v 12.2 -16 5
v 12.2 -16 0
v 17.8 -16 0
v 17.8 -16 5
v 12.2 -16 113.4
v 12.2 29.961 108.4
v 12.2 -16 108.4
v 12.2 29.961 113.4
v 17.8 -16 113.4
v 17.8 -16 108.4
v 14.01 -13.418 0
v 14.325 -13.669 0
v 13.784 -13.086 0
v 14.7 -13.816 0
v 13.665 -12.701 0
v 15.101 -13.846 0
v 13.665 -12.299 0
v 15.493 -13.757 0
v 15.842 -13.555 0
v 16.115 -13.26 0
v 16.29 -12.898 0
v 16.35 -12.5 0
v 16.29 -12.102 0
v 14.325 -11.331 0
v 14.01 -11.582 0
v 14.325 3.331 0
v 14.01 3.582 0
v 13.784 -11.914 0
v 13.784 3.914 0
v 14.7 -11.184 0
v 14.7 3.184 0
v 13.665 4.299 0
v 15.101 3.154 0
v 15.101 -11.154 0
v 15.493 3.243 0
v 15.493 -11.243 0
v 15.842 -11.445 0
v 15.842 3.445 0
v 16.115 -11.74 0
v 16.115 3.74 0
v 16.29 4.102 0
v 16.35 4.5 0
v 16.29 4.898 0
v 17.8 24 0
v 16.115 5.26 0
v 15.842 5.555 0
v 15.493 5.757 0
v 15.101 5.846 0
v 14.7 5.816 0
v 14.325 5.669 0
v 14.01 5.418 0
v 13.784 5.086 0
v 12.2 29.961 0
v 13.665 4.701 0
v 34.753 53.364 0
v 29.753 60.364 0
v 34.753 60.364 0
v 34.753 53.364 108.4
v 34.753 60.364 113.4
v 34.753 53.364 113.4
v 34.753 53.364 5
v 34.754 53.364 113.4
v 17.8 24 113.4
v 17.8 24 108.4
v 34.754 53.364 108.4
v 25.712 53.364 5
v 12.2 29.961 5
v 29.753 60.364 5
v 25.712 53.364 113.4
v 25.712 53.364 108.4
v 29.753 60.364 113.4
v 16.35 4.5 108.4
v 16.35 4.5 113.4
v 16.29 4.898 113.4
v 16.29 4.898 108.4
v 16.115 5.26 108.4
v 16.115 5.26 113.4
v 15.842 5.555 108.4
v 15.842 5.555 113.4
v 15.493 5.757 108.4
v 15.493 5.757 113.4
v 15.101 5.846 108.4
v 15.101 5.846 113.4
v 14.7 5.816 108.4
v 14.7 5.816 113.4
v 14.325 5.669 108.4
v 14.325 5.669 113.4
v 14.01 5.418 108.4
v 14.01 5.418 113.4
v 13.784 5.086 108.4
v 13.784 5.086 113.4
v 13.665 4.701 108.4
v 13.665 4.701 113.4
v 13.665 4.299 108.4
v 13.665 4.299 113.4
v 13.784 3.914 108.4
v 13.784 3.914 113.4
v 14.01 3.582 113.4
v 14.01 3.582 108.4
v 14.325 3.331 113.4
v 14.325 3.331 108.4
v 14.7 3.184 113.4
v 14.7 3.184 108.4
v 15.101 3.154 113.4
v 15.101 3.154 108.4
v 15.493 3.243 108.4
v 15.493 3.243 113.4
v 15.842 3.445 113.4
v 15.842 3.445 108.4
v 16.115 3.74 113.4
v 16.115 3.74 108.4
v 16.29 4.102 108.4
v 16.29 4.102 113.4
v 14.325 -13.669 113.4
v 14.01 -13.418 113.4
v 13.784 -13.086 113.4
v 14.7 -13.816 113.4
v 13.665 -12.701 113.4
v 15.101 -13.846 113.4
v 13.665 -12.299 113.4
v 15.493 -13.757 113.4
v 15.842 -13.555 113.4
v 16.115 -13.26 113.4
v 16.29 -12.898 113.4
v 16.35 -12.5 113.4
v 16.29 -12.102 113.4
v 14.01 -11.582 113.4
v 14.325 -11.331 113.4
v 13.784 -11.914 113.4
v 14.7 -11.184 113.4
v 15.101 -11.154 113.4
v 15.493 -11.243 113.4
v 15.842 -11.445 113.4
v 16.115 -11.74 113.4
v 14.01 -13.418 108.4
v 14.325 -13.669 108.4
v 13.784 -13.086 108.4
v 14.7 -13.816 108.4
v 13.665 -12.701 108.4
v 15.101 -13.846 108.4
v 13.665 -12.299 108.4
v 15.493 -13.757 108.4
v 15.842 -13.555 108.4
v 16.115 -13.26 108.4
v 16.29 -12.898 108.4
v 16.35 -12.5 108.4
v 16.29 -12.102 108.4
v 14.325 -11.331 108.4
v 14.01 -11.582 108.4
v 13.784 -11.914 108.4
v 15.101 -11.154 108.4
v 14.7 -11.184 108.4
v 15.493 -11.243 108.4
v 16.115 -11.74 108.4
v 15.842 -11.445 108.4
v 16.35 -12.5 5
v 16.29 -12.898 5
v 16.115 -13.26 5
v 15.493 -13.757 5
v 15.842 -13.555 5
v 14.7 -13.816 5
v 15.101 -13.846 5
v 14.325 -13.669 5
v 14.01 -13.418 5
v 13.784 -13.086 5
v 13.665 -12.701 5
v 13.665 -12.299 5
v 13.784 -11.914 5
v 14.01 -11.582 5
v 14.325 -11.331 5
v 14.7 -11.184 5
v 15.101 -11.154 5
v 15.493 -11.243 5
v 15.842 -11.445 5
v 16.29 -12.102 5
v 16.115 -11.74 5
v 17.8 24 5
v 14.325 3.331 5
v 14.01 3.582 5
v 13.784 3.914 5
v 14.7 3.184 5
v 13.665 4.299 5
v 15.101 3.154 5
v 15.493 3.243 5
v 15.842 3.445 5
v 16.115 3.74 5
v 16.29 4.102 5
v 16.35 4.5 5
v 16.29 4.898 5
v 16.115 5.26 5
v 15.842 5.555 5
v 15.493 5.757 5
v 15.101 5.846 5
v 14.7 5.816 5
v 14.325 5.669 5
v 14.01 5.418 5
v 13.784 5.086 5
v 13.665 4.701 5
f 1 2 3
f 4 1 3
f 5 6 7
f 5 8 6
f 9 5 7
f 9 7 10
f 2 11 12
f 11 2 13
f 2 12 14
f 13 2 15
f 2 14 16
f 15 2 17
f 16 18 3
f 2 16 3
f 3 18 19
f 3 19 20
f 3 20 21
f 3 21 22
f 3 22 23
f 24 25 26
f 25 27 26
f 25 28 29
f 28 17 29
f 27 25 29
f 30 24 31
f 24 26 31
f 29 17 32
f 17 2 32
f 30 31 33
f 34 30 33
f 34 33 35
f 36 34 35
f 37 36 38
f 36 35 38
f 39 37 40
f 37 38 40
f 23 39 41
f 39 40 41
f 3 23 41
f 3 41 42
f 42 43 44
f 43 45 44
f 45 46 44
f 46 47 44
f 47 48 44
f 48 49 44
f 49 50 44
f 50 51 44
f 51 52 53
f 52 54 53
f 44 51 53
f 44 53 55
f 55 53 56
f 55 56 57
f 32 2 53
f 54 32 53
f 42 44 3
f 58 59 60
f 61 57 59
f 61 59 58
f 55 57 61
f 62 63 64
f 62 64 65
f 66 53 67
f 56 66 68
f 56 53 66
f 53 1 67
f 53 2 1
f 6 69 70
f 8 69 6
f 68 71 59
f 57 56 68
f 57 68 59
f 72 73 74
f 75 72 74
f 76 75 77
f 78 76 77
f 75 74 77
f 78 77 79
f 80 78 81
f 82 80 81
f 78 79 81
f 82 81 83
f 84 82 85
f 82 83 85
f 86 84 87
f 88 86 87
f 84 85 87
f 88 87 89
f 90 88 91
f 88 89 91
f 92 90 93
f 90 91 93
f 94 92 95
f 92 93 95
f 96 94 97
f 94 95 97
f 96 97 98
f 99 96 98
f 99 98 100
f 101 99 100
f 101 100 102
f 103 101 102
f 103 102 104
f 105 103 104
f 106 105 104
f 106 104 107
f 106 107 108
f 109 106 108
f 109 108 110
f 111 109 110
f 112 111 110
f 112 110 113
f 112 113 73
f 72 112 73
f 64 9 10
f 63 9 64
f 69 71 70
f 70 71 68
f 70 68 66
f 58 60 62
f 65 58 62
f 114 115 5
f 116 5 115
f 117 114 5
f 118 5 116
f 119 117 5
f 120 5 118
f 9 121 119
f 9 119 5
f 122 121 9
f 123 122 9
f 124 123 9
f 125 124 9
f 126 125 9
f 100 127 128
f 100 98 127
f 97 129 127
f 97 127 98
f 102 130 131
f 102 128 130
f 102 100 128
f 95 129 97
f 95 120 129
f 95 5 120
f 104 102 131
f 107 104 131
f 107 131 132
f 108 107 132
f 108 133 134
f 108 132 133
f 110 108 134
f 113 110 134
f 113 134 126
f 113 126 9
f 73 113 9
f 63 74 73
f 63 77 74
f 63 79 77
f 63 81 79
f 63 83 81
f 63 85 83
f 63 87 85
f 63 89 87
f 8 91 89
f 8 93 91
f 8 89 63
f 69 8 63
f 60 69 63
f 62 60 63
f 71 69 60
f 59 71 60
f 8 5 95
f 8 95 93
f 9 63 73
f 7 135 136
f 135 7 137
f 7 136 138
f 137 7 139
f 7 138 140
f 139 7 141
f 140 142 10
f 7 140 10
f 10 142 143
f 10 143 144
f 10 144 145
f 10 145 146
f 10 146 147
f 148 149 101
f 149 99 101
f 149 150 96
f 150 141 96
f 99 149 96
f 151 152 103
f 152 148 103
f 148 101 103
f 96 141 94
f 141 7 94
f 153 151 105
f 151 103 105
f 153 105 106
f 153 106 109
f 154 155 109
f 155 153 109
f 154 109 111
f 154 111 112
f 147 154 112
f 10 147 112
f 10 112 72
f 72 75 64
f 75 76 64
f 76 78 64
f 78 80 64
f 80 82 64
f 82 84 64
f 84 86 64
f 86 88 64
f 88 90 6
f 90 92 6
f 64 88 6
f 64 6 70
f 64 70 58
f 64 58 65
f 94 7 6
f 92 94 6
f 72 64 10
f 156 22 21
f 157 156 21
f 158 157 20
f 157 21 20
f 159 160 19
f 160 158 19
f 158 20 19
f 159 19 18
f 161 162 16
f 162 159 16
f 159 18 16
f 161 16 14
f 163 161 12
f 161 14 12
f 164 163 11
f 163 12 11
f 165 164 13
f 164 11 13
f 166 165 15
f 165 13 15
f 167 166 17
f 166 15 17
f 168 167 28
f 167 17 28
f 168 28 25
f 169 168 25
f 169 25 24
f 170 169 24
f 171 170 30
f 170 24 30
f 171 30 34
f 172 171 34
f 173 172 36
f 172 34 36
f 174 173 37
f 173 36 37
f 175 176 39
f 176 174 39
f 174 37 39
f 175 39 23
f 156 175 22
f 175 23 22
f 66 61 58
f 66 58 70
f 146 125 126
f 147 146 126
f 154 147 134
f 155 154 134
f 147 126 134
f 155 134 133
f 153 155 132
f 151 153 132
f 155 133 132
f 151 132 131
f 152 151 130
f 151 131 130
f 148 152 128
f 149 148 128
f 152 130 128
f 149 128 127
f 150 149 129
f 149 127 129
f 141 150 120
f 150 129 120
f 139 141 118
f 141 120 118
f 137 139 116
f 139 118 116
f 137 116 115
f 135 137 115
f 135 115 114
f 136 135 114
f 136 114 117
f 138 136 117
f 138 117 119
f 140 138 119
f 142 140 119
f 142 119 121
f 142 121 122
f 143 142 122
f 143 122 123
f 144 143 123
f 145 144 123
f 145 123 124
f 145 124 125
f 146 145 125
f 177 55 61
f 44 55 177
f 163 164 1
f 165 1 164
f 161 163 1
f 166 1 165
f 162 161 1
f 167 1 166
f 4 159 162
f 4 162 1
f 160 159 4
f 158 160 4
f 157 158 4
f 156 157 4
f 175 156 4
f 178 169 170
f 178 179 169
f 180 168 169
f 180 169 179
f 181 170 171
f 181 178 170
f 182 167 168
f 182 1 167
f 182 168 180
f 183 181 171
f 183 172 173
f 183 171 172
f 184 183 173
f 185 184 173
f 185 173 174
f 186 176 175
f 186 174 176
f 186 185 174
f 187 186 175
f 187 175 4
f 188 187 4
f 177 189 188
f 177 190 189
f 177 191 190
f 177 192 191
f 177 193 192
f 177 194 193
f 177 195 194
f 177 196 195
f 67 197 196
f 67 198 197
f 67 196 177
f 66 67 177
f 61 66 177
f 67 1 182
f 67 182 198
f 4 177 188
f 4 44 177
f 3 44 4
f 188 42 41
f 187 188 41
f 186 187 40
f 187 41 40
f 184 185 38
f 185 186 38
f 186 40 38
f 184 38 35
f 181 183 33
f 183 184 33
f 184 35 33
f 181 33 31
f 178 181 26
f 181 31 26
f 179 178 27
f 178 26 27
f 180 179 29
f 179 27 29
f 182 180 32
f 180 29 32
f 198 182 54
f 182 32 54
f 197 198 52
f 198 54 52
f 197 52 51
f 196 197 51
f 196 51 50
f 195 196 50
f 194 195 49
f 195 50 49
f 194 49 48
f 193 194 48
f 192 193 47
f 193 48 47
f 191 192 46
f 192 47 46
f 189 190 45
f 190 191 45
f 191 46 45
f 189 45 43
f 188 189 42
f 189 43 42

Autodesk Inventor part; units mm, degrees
ref_plane "YZ Plane" through (0, 0, 0) normal (1, 0, 0) x (0, 1, 0)
ref_plane "XZ Plane" through (0, 0, 0) normal (0, 1, 0) x (-1, 0, 0)
sketch "Sketch1" plane through (0, 0, 0) normal (0, 0, 1) x (1, 0, 0)
  arc A0 (12.2, 9) -> (9.2, 12) centre (9.2, 9) ccw projected
  line L0 (12.7, 12) -> (9.2, 12) projected
  line L1 (12.7, 12) -> (17.8, 6) projected
  line L2 (17.8, 6) -> (17.8, -32.6) projected
  line L3 (17.8, -32.6) -> (12.7, -38.6) projected
  line L4 (12.7, -38.6) -> (-12.7, -38.6) projected
  line L5 (-12.7, -38.6) -> (-17.8, -32.6) projected
  line L6 (-17.8, -32.6) -> (-17.8, 6) projected
  line L7 (-17.8, 6) -> (-12.7, 12) projected
  line L8 (-9.2, 12) -> (-12.7, 12) projected
  arc A1 (-9.2, 12) -> (-12.2, 9) centre (-9.2, 9) ccw projected
  line L9 (-12.2, -30) -> (-12.2, 9) projected
  arc A2 (-12.2, -30) -> (-9.2, -33) centre (-9.2, -30) ccw projected
  line L10 (9.2, -33) -> (-9.2, -33) projected
  arc A3 (9.2, -33) -> (12.2, -30) centre (9.2, -30) ccw projected
  line L11 (12.2, 9) -> (12.2, -30) projected
  circle A4 centre (-15, -29.5) radius 1.35 projected
  circle A5 centre (15, -29.5) radius 1.35 projected
  circle A6 centre (-8.5, -35.8) radius 1.35 projected
  circle A7 centre (-15, -12.5) radius 1.35 projected
  circle A8 centre (-15, 4.5) radius 1.35 projected
  circle A9 centre (8.5, -35.8) radius 1.35 projected
  circle A10 centre (15, -12.5) radius 1.35 projected
  circle A11 centre (15, 4.5) radius 1.35 projected
  line L12 (12.2, -16) -> (12.2, 29.9608)
  line L13 (29.7534, 60.3642) -> (34.7534, 60.3642)
  line L14 (34.7534, 60.3642) -> (34.7534, 53.3642)
  line L15 (34.7534, 53.3642) -> (17.8, 24)
  line L16 (17.8, 24) -> (17.8, -16)
  line L17 (12.2, -16) -> (17.8, -16)
  circle A12 centre (15, -12.5) radius 1.35
  circle A13 centre (15, 4.5) radius 1.35
  line L18 (12.2, 29.9608) -> (29.7534, 60.3642)
  point P0 (0, 0)
  dimension "d1" = 2.7
  dimension "d2" = 2.7
  dimension "d3" = 5.6
  dimension "d4" = 3.5
  dimension "d5" = 40
  dimension "d6" = 30
  dimension "d7" = 7
  dimension "d9" = 5
extrude "Extrusion1" add sketch "Sketch1" along normal blind 5 contours L12 L0 L1 L2 L17 L11 | L12 L18 L13 L14 L15 L16 L1 L0
sketch "Sketch2" plane through (0, 0, 5) normal (0, 0, 1) x (1, 0, 0)
  line L0 (34.7534, 60.3642) -> (34.7534, 53.3642) projected
  line L1 (29.7534, 60.3642) -> (34.7534, 60.3642) projected
  line L2 (34.7534, 60.3642) -> (29.7534, 60.3642)
  line L3 (34.7534, 60.3642) -> (29.7534, 60.3642) projected
  line L4 (29.7534, 60.3642) -> (25.712, 53.3642)
  line L5 (29.7534, 60.3642) -> (12.2, 29.9608) projected
  line L6 (34.7534, 53.3642) -> (25.712, 53.3642)
  line L7 (34.7534, 53.3642) -> (34.7534, 60.3642)
  point P0 (0, 0)
ref_plane "Work Plane1" through (12.1861, 4.5831, 113.4) normal (0, 0, -1) x (0, 1, 0)
extrude "Extrusion2" add sketch "Sketch2" along normal up to surface (108.4 mm away)
sketch "Sketch3" plane through (25.712, 53.3642, 113.4) normal (0, 0, 1) x (1, 0, 0)
  line L0 (9.0415, 7) -> (4.0415, 7) projected
  line L1 (4.0415, 7) -> (0, 0) projected
  line L2 (0, 0) -> (9.0415, 0) projected
  line L3 (9.0415, 0) -> (9.0415, 7) projected
  circle A0 centre (-10.712, -48.8642) radius 1.35 projected
  circle A1 centre (-10.712, -65.8642) radius 1.35 projected
  line L4 (-13.512, -23.4034) -> (-13.512, -69.3642) projected
  line L5 (4.0415, 7) -> (-13.512, -23.4034) projected
  line L6 (9.0415, 7) -> (4.0415, 7) projected
  line L7 (9.0415, 0) -> (9.0415, 7) projected
  line L8 (-7.912, -29.3642) -> (9.0415, 0) projected
  line L9 (-7.912, -69.3642) -> (-7.912, -29.3642) projected
  line L10 (-13.512, -69.3642) -> (-7.912, -69.3642) projected
  point P0 (-25.712, -53.3642)
extrude "Extrusion3" add sketch "Sketch3" against normal blind 5 contours L8 L9 L10 L4 L5 L2
properties part number "Alça" material "Aluminum-6061"
